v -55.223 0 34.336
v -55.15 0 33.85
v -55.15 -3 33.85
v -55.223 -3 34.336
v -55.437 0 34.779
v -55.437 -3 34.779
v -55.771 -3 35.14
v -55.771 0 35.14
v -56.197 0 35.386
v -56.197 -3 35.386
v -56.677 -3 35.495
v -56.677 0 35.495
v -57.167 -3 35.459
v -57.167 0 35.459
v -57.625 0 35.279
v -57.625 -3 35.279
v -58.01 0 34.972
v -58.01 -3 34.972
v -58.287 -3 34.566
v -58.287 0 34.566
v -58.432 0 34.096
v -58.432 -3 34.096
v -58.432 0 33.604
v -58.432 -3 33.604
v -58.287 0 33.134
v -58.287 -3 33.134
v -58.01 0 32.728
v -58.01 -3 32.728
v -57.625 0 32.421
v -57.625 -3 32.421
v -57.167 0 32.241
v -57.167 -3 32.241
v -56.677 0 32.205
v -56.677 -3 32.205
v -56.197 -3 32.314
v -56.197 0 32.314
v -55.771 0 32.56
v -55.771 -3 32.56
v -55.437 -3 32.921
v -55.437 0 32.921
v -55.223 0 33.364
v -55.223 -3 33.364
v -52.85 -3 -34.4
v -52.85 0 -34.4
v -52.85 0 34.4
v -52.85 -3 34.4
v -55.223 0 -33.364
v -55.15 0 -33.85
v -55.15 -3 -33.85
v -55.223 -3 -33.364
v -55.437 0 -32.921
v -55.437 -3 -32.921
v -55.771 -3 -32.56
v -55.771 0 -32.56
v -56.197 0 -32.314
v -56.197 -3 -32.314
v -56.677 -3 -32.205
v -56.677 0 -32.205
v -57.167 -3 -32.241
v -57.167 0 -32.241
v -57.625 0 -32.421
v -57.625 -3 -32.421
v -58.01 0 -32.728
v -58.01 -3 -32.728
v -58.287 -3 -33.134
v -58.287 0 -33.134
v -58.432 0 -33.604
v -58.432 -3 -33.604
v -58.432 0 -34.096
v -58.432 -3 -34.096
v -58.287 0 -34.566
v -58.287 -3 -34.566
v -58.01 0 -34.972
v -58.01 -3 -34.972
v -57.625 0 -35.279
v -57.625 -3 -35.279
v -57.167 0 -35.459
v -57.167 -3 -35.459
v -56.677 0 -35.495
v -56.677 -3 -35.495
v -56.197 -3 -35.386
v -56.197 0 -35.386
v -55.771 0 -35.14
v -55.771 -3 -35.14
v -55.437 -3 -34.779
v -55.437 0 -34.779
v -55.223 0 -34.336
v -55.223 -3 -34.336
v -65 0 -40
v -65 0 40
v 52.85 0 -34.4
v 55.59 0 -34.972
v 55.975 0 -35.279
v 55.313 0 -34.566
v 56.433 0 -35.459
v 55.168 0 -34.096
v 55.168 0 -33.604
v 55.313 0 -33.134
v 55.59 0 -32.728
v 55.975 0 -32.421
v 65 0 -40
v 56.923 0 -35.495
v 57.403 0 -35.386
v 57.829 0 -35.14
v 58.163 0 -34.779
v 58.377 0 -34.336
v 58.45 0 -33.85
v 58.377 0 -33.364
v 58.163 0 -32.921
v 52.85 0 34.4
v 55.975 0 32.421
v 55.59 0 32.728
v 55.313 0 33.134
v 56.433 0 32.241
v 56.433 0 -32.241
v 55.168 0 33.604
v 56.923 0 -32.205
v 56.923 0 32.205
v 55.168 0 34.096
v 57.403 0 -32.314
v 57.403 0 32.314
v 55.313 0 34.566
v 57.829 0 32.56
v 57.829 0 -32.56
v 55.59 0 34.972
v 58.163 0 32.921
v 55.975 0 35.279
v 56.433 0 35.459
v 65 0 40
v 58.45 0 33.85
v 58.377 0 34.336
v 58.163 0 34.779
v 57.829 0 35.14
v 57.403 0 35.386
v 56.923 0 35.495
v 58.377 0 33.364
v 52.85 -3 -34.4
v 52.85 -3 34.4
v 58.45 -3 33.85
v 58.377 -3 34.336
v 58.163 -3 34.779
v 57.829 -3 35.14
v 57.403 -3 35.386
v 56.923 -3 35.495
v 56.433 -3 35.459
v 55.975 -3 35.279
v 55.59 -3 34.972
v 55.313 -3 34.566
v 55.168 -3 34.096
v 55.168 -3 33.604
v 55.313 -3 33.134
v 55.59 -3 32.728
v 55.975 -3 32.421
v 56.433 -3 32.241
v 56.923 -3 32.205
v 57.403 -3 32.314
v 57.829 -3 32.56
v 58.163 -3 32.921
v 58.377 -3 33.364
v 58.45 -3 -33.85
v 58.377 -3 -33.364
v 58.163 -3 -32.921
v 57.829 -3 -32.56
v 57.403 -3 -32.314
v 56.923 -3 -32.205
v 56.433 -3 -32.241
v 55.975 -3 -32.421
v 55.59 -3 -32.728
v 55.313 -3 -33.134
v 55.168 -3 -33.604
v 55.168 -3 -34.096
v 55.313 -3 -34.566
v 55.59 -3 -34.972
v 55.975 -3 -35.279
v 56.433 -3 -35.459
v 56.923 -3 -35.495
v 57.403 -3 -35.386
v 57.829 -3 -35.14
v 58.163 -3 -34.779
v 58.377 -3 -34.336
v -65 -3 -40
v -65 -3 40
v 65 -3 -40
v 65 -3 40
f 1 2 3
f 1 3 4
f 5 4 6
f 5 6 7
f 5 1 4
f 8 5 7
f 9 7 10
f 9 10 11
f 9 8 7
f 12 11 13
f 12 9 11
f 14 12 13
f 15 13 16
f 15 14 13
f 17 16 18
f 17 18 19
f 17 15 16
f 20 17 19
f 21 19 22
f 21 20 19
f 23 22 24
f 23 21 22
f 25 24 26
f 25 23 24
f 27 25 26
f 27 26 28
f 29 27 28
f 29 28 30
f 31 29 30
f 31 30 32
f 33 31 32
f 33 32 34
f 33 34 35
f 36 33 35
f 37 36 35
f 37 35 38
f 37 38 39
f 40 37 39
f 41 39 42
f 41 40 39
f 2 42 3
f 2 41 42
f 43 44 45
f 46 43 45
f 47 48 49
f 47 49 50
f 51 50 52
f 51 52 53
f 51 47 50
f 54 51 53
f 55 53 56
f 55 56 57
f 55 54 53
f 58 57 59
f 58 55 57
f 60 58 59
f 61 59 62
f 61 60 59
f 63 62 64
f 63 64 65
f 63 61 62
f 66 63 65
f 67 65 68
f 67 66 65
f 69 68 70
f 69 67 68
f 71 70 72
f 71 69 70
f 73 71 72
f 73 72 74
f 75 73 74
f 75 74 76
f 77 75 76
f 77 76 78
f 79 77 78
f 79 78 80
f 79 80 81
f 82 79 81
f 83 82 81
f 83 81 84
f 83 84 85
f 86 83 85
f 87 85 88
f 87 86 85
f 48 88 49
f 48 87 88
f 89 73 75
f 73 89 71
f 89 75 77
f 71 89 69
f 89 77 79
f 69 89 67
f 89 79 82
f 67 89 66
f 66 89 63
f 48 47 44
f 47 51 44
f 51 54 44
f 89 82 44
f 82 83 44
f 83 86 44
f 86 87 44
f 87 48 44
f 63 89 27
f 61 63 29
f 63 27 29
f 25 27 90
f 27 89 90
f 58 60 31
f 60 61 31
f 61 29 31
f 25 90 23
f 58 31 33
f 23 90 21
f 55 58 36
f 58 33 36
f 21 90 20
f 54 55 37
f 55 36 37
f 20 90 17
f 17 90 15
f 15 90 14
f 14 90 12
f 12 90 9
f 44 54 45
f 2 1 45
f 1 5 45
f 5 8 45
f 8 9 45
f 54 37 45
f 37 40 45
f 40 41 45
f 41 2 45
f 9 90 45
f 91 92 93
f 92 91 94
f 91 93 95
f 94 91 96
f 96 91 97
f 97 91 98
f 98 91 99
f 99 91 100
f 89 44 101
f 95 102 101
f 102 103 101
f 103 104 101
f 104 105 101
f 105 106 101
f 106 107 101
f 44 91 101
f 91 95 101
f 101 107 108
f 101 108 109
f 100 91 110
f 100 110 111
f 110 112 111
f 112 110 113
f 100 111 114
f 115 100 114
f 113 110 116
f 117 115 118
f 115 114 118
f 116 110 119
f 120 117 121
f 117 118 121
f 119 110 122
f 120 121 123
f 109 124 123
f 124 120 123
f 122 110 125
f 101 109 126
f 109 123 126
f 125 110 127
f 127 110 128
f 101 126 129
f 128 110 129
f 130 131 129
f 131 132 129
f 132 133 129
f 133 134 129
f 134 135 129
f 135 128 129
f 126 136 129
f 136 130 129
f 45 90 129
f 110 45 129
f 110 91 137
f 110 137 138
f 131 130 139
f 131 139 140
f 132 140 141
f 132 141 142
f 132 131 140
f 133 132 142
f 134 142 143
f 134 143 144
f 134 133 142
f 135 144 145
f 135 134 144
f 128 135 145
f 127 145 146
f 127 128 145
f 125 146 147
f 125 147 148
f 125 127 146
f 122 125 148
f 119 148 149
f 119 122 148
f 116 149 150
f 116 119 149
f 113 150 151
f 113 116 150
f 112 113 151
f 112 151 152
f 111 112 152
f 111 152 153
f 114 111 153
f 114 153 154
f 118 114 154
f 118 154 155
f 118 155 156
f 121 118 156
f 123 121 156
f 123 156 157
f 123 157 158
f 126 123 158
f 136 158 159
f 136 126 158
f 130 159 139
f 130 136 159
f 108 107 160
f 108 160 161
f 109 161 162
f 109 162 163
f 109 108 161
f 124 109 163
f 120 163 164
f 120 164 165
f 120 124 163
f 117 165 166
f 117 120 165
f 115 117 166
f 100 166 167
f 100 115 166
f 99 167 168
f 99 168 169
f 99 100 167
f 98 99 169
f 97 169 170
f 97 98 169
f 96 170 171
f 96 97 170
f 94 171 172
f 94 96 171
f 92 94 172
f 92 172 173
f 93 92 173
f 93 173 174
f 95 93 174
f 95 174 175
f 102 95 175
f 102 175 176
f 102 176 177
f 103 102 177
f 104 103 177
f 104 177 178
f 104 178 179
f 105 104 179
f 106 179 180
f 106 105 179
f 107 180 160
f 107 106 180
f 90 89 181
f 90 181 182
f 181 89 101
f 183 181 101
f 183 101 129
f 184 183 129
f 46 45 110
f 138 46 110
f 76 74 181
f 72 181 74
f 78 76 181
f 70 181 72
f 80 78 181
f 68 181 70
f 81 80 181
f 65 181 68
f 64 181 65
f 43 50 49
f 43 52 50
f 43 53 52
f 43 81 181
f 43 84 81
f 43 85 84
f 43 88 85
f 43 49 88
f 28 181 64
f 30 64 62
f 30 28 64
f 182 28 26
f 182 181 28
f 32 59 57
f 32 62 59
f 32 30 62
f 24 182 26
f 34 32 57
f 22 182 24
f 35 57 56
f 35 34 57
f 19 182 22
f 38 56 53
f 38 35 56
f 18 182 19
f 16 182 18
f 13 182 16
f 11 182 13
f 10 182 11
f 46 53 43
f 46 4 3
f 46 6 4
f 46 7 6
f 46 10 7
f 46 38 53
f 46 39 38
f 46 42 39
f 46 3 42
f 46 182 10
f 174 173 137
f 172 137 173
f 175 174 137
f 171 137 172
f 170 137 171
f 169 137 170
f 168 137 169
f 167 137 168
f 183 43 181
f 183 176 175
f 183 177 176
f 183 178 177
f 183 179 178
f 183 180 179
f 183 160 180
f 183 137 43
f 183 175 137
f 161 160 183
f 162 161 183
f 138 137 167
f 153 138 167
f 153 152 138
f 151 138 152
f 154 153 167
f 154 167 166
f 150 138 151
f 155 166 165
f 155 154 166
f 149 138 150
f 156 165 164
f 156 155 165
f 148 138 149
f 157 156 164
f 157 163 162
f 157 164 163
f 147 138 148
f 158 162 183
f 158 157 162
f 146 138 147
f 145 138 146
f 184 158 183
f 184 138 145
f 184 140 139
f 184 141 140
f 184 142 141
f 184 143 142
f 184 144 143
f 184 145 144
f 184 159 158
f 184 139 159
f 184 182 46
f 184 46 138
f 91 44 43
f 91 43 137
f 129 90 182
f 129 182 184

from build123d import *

# Parameters (mm, degrees)
F0_W     = 130
F0_H     = 80
F0_R     = 1.65
F0_W_2   = 105.7
F0_H_2   = 68.8
F1_DEPTH = 3


with BuildPart() as f1:
    # F0 (on Front) → F1 (new body)
    with BuildSketch(Plane.XZ):
        Rectangle(F0_W, F0_H)
        with Locations((-56.8, -33.85)):
            Circle(F0_R, mode=Mode.SUBTRACT)
        with Locations((56.8, -33.85)):
            Circle(F0_R, mode=Mode.SUBTRACT)
        with Locations((-56.8, 33.85)):
            Circle(F0_R, mode=Mode.SUBTRACT)
        Rectangle(F0_W_2, F0_H_2, mode=Mode.SUBTRACT)
        with Locations((56.8, 33.85)):
            Circle(F0_R, mode=Mode.SUBTRACT)
    extrude(amount=F1_DEPTH)


solid = f1.part
